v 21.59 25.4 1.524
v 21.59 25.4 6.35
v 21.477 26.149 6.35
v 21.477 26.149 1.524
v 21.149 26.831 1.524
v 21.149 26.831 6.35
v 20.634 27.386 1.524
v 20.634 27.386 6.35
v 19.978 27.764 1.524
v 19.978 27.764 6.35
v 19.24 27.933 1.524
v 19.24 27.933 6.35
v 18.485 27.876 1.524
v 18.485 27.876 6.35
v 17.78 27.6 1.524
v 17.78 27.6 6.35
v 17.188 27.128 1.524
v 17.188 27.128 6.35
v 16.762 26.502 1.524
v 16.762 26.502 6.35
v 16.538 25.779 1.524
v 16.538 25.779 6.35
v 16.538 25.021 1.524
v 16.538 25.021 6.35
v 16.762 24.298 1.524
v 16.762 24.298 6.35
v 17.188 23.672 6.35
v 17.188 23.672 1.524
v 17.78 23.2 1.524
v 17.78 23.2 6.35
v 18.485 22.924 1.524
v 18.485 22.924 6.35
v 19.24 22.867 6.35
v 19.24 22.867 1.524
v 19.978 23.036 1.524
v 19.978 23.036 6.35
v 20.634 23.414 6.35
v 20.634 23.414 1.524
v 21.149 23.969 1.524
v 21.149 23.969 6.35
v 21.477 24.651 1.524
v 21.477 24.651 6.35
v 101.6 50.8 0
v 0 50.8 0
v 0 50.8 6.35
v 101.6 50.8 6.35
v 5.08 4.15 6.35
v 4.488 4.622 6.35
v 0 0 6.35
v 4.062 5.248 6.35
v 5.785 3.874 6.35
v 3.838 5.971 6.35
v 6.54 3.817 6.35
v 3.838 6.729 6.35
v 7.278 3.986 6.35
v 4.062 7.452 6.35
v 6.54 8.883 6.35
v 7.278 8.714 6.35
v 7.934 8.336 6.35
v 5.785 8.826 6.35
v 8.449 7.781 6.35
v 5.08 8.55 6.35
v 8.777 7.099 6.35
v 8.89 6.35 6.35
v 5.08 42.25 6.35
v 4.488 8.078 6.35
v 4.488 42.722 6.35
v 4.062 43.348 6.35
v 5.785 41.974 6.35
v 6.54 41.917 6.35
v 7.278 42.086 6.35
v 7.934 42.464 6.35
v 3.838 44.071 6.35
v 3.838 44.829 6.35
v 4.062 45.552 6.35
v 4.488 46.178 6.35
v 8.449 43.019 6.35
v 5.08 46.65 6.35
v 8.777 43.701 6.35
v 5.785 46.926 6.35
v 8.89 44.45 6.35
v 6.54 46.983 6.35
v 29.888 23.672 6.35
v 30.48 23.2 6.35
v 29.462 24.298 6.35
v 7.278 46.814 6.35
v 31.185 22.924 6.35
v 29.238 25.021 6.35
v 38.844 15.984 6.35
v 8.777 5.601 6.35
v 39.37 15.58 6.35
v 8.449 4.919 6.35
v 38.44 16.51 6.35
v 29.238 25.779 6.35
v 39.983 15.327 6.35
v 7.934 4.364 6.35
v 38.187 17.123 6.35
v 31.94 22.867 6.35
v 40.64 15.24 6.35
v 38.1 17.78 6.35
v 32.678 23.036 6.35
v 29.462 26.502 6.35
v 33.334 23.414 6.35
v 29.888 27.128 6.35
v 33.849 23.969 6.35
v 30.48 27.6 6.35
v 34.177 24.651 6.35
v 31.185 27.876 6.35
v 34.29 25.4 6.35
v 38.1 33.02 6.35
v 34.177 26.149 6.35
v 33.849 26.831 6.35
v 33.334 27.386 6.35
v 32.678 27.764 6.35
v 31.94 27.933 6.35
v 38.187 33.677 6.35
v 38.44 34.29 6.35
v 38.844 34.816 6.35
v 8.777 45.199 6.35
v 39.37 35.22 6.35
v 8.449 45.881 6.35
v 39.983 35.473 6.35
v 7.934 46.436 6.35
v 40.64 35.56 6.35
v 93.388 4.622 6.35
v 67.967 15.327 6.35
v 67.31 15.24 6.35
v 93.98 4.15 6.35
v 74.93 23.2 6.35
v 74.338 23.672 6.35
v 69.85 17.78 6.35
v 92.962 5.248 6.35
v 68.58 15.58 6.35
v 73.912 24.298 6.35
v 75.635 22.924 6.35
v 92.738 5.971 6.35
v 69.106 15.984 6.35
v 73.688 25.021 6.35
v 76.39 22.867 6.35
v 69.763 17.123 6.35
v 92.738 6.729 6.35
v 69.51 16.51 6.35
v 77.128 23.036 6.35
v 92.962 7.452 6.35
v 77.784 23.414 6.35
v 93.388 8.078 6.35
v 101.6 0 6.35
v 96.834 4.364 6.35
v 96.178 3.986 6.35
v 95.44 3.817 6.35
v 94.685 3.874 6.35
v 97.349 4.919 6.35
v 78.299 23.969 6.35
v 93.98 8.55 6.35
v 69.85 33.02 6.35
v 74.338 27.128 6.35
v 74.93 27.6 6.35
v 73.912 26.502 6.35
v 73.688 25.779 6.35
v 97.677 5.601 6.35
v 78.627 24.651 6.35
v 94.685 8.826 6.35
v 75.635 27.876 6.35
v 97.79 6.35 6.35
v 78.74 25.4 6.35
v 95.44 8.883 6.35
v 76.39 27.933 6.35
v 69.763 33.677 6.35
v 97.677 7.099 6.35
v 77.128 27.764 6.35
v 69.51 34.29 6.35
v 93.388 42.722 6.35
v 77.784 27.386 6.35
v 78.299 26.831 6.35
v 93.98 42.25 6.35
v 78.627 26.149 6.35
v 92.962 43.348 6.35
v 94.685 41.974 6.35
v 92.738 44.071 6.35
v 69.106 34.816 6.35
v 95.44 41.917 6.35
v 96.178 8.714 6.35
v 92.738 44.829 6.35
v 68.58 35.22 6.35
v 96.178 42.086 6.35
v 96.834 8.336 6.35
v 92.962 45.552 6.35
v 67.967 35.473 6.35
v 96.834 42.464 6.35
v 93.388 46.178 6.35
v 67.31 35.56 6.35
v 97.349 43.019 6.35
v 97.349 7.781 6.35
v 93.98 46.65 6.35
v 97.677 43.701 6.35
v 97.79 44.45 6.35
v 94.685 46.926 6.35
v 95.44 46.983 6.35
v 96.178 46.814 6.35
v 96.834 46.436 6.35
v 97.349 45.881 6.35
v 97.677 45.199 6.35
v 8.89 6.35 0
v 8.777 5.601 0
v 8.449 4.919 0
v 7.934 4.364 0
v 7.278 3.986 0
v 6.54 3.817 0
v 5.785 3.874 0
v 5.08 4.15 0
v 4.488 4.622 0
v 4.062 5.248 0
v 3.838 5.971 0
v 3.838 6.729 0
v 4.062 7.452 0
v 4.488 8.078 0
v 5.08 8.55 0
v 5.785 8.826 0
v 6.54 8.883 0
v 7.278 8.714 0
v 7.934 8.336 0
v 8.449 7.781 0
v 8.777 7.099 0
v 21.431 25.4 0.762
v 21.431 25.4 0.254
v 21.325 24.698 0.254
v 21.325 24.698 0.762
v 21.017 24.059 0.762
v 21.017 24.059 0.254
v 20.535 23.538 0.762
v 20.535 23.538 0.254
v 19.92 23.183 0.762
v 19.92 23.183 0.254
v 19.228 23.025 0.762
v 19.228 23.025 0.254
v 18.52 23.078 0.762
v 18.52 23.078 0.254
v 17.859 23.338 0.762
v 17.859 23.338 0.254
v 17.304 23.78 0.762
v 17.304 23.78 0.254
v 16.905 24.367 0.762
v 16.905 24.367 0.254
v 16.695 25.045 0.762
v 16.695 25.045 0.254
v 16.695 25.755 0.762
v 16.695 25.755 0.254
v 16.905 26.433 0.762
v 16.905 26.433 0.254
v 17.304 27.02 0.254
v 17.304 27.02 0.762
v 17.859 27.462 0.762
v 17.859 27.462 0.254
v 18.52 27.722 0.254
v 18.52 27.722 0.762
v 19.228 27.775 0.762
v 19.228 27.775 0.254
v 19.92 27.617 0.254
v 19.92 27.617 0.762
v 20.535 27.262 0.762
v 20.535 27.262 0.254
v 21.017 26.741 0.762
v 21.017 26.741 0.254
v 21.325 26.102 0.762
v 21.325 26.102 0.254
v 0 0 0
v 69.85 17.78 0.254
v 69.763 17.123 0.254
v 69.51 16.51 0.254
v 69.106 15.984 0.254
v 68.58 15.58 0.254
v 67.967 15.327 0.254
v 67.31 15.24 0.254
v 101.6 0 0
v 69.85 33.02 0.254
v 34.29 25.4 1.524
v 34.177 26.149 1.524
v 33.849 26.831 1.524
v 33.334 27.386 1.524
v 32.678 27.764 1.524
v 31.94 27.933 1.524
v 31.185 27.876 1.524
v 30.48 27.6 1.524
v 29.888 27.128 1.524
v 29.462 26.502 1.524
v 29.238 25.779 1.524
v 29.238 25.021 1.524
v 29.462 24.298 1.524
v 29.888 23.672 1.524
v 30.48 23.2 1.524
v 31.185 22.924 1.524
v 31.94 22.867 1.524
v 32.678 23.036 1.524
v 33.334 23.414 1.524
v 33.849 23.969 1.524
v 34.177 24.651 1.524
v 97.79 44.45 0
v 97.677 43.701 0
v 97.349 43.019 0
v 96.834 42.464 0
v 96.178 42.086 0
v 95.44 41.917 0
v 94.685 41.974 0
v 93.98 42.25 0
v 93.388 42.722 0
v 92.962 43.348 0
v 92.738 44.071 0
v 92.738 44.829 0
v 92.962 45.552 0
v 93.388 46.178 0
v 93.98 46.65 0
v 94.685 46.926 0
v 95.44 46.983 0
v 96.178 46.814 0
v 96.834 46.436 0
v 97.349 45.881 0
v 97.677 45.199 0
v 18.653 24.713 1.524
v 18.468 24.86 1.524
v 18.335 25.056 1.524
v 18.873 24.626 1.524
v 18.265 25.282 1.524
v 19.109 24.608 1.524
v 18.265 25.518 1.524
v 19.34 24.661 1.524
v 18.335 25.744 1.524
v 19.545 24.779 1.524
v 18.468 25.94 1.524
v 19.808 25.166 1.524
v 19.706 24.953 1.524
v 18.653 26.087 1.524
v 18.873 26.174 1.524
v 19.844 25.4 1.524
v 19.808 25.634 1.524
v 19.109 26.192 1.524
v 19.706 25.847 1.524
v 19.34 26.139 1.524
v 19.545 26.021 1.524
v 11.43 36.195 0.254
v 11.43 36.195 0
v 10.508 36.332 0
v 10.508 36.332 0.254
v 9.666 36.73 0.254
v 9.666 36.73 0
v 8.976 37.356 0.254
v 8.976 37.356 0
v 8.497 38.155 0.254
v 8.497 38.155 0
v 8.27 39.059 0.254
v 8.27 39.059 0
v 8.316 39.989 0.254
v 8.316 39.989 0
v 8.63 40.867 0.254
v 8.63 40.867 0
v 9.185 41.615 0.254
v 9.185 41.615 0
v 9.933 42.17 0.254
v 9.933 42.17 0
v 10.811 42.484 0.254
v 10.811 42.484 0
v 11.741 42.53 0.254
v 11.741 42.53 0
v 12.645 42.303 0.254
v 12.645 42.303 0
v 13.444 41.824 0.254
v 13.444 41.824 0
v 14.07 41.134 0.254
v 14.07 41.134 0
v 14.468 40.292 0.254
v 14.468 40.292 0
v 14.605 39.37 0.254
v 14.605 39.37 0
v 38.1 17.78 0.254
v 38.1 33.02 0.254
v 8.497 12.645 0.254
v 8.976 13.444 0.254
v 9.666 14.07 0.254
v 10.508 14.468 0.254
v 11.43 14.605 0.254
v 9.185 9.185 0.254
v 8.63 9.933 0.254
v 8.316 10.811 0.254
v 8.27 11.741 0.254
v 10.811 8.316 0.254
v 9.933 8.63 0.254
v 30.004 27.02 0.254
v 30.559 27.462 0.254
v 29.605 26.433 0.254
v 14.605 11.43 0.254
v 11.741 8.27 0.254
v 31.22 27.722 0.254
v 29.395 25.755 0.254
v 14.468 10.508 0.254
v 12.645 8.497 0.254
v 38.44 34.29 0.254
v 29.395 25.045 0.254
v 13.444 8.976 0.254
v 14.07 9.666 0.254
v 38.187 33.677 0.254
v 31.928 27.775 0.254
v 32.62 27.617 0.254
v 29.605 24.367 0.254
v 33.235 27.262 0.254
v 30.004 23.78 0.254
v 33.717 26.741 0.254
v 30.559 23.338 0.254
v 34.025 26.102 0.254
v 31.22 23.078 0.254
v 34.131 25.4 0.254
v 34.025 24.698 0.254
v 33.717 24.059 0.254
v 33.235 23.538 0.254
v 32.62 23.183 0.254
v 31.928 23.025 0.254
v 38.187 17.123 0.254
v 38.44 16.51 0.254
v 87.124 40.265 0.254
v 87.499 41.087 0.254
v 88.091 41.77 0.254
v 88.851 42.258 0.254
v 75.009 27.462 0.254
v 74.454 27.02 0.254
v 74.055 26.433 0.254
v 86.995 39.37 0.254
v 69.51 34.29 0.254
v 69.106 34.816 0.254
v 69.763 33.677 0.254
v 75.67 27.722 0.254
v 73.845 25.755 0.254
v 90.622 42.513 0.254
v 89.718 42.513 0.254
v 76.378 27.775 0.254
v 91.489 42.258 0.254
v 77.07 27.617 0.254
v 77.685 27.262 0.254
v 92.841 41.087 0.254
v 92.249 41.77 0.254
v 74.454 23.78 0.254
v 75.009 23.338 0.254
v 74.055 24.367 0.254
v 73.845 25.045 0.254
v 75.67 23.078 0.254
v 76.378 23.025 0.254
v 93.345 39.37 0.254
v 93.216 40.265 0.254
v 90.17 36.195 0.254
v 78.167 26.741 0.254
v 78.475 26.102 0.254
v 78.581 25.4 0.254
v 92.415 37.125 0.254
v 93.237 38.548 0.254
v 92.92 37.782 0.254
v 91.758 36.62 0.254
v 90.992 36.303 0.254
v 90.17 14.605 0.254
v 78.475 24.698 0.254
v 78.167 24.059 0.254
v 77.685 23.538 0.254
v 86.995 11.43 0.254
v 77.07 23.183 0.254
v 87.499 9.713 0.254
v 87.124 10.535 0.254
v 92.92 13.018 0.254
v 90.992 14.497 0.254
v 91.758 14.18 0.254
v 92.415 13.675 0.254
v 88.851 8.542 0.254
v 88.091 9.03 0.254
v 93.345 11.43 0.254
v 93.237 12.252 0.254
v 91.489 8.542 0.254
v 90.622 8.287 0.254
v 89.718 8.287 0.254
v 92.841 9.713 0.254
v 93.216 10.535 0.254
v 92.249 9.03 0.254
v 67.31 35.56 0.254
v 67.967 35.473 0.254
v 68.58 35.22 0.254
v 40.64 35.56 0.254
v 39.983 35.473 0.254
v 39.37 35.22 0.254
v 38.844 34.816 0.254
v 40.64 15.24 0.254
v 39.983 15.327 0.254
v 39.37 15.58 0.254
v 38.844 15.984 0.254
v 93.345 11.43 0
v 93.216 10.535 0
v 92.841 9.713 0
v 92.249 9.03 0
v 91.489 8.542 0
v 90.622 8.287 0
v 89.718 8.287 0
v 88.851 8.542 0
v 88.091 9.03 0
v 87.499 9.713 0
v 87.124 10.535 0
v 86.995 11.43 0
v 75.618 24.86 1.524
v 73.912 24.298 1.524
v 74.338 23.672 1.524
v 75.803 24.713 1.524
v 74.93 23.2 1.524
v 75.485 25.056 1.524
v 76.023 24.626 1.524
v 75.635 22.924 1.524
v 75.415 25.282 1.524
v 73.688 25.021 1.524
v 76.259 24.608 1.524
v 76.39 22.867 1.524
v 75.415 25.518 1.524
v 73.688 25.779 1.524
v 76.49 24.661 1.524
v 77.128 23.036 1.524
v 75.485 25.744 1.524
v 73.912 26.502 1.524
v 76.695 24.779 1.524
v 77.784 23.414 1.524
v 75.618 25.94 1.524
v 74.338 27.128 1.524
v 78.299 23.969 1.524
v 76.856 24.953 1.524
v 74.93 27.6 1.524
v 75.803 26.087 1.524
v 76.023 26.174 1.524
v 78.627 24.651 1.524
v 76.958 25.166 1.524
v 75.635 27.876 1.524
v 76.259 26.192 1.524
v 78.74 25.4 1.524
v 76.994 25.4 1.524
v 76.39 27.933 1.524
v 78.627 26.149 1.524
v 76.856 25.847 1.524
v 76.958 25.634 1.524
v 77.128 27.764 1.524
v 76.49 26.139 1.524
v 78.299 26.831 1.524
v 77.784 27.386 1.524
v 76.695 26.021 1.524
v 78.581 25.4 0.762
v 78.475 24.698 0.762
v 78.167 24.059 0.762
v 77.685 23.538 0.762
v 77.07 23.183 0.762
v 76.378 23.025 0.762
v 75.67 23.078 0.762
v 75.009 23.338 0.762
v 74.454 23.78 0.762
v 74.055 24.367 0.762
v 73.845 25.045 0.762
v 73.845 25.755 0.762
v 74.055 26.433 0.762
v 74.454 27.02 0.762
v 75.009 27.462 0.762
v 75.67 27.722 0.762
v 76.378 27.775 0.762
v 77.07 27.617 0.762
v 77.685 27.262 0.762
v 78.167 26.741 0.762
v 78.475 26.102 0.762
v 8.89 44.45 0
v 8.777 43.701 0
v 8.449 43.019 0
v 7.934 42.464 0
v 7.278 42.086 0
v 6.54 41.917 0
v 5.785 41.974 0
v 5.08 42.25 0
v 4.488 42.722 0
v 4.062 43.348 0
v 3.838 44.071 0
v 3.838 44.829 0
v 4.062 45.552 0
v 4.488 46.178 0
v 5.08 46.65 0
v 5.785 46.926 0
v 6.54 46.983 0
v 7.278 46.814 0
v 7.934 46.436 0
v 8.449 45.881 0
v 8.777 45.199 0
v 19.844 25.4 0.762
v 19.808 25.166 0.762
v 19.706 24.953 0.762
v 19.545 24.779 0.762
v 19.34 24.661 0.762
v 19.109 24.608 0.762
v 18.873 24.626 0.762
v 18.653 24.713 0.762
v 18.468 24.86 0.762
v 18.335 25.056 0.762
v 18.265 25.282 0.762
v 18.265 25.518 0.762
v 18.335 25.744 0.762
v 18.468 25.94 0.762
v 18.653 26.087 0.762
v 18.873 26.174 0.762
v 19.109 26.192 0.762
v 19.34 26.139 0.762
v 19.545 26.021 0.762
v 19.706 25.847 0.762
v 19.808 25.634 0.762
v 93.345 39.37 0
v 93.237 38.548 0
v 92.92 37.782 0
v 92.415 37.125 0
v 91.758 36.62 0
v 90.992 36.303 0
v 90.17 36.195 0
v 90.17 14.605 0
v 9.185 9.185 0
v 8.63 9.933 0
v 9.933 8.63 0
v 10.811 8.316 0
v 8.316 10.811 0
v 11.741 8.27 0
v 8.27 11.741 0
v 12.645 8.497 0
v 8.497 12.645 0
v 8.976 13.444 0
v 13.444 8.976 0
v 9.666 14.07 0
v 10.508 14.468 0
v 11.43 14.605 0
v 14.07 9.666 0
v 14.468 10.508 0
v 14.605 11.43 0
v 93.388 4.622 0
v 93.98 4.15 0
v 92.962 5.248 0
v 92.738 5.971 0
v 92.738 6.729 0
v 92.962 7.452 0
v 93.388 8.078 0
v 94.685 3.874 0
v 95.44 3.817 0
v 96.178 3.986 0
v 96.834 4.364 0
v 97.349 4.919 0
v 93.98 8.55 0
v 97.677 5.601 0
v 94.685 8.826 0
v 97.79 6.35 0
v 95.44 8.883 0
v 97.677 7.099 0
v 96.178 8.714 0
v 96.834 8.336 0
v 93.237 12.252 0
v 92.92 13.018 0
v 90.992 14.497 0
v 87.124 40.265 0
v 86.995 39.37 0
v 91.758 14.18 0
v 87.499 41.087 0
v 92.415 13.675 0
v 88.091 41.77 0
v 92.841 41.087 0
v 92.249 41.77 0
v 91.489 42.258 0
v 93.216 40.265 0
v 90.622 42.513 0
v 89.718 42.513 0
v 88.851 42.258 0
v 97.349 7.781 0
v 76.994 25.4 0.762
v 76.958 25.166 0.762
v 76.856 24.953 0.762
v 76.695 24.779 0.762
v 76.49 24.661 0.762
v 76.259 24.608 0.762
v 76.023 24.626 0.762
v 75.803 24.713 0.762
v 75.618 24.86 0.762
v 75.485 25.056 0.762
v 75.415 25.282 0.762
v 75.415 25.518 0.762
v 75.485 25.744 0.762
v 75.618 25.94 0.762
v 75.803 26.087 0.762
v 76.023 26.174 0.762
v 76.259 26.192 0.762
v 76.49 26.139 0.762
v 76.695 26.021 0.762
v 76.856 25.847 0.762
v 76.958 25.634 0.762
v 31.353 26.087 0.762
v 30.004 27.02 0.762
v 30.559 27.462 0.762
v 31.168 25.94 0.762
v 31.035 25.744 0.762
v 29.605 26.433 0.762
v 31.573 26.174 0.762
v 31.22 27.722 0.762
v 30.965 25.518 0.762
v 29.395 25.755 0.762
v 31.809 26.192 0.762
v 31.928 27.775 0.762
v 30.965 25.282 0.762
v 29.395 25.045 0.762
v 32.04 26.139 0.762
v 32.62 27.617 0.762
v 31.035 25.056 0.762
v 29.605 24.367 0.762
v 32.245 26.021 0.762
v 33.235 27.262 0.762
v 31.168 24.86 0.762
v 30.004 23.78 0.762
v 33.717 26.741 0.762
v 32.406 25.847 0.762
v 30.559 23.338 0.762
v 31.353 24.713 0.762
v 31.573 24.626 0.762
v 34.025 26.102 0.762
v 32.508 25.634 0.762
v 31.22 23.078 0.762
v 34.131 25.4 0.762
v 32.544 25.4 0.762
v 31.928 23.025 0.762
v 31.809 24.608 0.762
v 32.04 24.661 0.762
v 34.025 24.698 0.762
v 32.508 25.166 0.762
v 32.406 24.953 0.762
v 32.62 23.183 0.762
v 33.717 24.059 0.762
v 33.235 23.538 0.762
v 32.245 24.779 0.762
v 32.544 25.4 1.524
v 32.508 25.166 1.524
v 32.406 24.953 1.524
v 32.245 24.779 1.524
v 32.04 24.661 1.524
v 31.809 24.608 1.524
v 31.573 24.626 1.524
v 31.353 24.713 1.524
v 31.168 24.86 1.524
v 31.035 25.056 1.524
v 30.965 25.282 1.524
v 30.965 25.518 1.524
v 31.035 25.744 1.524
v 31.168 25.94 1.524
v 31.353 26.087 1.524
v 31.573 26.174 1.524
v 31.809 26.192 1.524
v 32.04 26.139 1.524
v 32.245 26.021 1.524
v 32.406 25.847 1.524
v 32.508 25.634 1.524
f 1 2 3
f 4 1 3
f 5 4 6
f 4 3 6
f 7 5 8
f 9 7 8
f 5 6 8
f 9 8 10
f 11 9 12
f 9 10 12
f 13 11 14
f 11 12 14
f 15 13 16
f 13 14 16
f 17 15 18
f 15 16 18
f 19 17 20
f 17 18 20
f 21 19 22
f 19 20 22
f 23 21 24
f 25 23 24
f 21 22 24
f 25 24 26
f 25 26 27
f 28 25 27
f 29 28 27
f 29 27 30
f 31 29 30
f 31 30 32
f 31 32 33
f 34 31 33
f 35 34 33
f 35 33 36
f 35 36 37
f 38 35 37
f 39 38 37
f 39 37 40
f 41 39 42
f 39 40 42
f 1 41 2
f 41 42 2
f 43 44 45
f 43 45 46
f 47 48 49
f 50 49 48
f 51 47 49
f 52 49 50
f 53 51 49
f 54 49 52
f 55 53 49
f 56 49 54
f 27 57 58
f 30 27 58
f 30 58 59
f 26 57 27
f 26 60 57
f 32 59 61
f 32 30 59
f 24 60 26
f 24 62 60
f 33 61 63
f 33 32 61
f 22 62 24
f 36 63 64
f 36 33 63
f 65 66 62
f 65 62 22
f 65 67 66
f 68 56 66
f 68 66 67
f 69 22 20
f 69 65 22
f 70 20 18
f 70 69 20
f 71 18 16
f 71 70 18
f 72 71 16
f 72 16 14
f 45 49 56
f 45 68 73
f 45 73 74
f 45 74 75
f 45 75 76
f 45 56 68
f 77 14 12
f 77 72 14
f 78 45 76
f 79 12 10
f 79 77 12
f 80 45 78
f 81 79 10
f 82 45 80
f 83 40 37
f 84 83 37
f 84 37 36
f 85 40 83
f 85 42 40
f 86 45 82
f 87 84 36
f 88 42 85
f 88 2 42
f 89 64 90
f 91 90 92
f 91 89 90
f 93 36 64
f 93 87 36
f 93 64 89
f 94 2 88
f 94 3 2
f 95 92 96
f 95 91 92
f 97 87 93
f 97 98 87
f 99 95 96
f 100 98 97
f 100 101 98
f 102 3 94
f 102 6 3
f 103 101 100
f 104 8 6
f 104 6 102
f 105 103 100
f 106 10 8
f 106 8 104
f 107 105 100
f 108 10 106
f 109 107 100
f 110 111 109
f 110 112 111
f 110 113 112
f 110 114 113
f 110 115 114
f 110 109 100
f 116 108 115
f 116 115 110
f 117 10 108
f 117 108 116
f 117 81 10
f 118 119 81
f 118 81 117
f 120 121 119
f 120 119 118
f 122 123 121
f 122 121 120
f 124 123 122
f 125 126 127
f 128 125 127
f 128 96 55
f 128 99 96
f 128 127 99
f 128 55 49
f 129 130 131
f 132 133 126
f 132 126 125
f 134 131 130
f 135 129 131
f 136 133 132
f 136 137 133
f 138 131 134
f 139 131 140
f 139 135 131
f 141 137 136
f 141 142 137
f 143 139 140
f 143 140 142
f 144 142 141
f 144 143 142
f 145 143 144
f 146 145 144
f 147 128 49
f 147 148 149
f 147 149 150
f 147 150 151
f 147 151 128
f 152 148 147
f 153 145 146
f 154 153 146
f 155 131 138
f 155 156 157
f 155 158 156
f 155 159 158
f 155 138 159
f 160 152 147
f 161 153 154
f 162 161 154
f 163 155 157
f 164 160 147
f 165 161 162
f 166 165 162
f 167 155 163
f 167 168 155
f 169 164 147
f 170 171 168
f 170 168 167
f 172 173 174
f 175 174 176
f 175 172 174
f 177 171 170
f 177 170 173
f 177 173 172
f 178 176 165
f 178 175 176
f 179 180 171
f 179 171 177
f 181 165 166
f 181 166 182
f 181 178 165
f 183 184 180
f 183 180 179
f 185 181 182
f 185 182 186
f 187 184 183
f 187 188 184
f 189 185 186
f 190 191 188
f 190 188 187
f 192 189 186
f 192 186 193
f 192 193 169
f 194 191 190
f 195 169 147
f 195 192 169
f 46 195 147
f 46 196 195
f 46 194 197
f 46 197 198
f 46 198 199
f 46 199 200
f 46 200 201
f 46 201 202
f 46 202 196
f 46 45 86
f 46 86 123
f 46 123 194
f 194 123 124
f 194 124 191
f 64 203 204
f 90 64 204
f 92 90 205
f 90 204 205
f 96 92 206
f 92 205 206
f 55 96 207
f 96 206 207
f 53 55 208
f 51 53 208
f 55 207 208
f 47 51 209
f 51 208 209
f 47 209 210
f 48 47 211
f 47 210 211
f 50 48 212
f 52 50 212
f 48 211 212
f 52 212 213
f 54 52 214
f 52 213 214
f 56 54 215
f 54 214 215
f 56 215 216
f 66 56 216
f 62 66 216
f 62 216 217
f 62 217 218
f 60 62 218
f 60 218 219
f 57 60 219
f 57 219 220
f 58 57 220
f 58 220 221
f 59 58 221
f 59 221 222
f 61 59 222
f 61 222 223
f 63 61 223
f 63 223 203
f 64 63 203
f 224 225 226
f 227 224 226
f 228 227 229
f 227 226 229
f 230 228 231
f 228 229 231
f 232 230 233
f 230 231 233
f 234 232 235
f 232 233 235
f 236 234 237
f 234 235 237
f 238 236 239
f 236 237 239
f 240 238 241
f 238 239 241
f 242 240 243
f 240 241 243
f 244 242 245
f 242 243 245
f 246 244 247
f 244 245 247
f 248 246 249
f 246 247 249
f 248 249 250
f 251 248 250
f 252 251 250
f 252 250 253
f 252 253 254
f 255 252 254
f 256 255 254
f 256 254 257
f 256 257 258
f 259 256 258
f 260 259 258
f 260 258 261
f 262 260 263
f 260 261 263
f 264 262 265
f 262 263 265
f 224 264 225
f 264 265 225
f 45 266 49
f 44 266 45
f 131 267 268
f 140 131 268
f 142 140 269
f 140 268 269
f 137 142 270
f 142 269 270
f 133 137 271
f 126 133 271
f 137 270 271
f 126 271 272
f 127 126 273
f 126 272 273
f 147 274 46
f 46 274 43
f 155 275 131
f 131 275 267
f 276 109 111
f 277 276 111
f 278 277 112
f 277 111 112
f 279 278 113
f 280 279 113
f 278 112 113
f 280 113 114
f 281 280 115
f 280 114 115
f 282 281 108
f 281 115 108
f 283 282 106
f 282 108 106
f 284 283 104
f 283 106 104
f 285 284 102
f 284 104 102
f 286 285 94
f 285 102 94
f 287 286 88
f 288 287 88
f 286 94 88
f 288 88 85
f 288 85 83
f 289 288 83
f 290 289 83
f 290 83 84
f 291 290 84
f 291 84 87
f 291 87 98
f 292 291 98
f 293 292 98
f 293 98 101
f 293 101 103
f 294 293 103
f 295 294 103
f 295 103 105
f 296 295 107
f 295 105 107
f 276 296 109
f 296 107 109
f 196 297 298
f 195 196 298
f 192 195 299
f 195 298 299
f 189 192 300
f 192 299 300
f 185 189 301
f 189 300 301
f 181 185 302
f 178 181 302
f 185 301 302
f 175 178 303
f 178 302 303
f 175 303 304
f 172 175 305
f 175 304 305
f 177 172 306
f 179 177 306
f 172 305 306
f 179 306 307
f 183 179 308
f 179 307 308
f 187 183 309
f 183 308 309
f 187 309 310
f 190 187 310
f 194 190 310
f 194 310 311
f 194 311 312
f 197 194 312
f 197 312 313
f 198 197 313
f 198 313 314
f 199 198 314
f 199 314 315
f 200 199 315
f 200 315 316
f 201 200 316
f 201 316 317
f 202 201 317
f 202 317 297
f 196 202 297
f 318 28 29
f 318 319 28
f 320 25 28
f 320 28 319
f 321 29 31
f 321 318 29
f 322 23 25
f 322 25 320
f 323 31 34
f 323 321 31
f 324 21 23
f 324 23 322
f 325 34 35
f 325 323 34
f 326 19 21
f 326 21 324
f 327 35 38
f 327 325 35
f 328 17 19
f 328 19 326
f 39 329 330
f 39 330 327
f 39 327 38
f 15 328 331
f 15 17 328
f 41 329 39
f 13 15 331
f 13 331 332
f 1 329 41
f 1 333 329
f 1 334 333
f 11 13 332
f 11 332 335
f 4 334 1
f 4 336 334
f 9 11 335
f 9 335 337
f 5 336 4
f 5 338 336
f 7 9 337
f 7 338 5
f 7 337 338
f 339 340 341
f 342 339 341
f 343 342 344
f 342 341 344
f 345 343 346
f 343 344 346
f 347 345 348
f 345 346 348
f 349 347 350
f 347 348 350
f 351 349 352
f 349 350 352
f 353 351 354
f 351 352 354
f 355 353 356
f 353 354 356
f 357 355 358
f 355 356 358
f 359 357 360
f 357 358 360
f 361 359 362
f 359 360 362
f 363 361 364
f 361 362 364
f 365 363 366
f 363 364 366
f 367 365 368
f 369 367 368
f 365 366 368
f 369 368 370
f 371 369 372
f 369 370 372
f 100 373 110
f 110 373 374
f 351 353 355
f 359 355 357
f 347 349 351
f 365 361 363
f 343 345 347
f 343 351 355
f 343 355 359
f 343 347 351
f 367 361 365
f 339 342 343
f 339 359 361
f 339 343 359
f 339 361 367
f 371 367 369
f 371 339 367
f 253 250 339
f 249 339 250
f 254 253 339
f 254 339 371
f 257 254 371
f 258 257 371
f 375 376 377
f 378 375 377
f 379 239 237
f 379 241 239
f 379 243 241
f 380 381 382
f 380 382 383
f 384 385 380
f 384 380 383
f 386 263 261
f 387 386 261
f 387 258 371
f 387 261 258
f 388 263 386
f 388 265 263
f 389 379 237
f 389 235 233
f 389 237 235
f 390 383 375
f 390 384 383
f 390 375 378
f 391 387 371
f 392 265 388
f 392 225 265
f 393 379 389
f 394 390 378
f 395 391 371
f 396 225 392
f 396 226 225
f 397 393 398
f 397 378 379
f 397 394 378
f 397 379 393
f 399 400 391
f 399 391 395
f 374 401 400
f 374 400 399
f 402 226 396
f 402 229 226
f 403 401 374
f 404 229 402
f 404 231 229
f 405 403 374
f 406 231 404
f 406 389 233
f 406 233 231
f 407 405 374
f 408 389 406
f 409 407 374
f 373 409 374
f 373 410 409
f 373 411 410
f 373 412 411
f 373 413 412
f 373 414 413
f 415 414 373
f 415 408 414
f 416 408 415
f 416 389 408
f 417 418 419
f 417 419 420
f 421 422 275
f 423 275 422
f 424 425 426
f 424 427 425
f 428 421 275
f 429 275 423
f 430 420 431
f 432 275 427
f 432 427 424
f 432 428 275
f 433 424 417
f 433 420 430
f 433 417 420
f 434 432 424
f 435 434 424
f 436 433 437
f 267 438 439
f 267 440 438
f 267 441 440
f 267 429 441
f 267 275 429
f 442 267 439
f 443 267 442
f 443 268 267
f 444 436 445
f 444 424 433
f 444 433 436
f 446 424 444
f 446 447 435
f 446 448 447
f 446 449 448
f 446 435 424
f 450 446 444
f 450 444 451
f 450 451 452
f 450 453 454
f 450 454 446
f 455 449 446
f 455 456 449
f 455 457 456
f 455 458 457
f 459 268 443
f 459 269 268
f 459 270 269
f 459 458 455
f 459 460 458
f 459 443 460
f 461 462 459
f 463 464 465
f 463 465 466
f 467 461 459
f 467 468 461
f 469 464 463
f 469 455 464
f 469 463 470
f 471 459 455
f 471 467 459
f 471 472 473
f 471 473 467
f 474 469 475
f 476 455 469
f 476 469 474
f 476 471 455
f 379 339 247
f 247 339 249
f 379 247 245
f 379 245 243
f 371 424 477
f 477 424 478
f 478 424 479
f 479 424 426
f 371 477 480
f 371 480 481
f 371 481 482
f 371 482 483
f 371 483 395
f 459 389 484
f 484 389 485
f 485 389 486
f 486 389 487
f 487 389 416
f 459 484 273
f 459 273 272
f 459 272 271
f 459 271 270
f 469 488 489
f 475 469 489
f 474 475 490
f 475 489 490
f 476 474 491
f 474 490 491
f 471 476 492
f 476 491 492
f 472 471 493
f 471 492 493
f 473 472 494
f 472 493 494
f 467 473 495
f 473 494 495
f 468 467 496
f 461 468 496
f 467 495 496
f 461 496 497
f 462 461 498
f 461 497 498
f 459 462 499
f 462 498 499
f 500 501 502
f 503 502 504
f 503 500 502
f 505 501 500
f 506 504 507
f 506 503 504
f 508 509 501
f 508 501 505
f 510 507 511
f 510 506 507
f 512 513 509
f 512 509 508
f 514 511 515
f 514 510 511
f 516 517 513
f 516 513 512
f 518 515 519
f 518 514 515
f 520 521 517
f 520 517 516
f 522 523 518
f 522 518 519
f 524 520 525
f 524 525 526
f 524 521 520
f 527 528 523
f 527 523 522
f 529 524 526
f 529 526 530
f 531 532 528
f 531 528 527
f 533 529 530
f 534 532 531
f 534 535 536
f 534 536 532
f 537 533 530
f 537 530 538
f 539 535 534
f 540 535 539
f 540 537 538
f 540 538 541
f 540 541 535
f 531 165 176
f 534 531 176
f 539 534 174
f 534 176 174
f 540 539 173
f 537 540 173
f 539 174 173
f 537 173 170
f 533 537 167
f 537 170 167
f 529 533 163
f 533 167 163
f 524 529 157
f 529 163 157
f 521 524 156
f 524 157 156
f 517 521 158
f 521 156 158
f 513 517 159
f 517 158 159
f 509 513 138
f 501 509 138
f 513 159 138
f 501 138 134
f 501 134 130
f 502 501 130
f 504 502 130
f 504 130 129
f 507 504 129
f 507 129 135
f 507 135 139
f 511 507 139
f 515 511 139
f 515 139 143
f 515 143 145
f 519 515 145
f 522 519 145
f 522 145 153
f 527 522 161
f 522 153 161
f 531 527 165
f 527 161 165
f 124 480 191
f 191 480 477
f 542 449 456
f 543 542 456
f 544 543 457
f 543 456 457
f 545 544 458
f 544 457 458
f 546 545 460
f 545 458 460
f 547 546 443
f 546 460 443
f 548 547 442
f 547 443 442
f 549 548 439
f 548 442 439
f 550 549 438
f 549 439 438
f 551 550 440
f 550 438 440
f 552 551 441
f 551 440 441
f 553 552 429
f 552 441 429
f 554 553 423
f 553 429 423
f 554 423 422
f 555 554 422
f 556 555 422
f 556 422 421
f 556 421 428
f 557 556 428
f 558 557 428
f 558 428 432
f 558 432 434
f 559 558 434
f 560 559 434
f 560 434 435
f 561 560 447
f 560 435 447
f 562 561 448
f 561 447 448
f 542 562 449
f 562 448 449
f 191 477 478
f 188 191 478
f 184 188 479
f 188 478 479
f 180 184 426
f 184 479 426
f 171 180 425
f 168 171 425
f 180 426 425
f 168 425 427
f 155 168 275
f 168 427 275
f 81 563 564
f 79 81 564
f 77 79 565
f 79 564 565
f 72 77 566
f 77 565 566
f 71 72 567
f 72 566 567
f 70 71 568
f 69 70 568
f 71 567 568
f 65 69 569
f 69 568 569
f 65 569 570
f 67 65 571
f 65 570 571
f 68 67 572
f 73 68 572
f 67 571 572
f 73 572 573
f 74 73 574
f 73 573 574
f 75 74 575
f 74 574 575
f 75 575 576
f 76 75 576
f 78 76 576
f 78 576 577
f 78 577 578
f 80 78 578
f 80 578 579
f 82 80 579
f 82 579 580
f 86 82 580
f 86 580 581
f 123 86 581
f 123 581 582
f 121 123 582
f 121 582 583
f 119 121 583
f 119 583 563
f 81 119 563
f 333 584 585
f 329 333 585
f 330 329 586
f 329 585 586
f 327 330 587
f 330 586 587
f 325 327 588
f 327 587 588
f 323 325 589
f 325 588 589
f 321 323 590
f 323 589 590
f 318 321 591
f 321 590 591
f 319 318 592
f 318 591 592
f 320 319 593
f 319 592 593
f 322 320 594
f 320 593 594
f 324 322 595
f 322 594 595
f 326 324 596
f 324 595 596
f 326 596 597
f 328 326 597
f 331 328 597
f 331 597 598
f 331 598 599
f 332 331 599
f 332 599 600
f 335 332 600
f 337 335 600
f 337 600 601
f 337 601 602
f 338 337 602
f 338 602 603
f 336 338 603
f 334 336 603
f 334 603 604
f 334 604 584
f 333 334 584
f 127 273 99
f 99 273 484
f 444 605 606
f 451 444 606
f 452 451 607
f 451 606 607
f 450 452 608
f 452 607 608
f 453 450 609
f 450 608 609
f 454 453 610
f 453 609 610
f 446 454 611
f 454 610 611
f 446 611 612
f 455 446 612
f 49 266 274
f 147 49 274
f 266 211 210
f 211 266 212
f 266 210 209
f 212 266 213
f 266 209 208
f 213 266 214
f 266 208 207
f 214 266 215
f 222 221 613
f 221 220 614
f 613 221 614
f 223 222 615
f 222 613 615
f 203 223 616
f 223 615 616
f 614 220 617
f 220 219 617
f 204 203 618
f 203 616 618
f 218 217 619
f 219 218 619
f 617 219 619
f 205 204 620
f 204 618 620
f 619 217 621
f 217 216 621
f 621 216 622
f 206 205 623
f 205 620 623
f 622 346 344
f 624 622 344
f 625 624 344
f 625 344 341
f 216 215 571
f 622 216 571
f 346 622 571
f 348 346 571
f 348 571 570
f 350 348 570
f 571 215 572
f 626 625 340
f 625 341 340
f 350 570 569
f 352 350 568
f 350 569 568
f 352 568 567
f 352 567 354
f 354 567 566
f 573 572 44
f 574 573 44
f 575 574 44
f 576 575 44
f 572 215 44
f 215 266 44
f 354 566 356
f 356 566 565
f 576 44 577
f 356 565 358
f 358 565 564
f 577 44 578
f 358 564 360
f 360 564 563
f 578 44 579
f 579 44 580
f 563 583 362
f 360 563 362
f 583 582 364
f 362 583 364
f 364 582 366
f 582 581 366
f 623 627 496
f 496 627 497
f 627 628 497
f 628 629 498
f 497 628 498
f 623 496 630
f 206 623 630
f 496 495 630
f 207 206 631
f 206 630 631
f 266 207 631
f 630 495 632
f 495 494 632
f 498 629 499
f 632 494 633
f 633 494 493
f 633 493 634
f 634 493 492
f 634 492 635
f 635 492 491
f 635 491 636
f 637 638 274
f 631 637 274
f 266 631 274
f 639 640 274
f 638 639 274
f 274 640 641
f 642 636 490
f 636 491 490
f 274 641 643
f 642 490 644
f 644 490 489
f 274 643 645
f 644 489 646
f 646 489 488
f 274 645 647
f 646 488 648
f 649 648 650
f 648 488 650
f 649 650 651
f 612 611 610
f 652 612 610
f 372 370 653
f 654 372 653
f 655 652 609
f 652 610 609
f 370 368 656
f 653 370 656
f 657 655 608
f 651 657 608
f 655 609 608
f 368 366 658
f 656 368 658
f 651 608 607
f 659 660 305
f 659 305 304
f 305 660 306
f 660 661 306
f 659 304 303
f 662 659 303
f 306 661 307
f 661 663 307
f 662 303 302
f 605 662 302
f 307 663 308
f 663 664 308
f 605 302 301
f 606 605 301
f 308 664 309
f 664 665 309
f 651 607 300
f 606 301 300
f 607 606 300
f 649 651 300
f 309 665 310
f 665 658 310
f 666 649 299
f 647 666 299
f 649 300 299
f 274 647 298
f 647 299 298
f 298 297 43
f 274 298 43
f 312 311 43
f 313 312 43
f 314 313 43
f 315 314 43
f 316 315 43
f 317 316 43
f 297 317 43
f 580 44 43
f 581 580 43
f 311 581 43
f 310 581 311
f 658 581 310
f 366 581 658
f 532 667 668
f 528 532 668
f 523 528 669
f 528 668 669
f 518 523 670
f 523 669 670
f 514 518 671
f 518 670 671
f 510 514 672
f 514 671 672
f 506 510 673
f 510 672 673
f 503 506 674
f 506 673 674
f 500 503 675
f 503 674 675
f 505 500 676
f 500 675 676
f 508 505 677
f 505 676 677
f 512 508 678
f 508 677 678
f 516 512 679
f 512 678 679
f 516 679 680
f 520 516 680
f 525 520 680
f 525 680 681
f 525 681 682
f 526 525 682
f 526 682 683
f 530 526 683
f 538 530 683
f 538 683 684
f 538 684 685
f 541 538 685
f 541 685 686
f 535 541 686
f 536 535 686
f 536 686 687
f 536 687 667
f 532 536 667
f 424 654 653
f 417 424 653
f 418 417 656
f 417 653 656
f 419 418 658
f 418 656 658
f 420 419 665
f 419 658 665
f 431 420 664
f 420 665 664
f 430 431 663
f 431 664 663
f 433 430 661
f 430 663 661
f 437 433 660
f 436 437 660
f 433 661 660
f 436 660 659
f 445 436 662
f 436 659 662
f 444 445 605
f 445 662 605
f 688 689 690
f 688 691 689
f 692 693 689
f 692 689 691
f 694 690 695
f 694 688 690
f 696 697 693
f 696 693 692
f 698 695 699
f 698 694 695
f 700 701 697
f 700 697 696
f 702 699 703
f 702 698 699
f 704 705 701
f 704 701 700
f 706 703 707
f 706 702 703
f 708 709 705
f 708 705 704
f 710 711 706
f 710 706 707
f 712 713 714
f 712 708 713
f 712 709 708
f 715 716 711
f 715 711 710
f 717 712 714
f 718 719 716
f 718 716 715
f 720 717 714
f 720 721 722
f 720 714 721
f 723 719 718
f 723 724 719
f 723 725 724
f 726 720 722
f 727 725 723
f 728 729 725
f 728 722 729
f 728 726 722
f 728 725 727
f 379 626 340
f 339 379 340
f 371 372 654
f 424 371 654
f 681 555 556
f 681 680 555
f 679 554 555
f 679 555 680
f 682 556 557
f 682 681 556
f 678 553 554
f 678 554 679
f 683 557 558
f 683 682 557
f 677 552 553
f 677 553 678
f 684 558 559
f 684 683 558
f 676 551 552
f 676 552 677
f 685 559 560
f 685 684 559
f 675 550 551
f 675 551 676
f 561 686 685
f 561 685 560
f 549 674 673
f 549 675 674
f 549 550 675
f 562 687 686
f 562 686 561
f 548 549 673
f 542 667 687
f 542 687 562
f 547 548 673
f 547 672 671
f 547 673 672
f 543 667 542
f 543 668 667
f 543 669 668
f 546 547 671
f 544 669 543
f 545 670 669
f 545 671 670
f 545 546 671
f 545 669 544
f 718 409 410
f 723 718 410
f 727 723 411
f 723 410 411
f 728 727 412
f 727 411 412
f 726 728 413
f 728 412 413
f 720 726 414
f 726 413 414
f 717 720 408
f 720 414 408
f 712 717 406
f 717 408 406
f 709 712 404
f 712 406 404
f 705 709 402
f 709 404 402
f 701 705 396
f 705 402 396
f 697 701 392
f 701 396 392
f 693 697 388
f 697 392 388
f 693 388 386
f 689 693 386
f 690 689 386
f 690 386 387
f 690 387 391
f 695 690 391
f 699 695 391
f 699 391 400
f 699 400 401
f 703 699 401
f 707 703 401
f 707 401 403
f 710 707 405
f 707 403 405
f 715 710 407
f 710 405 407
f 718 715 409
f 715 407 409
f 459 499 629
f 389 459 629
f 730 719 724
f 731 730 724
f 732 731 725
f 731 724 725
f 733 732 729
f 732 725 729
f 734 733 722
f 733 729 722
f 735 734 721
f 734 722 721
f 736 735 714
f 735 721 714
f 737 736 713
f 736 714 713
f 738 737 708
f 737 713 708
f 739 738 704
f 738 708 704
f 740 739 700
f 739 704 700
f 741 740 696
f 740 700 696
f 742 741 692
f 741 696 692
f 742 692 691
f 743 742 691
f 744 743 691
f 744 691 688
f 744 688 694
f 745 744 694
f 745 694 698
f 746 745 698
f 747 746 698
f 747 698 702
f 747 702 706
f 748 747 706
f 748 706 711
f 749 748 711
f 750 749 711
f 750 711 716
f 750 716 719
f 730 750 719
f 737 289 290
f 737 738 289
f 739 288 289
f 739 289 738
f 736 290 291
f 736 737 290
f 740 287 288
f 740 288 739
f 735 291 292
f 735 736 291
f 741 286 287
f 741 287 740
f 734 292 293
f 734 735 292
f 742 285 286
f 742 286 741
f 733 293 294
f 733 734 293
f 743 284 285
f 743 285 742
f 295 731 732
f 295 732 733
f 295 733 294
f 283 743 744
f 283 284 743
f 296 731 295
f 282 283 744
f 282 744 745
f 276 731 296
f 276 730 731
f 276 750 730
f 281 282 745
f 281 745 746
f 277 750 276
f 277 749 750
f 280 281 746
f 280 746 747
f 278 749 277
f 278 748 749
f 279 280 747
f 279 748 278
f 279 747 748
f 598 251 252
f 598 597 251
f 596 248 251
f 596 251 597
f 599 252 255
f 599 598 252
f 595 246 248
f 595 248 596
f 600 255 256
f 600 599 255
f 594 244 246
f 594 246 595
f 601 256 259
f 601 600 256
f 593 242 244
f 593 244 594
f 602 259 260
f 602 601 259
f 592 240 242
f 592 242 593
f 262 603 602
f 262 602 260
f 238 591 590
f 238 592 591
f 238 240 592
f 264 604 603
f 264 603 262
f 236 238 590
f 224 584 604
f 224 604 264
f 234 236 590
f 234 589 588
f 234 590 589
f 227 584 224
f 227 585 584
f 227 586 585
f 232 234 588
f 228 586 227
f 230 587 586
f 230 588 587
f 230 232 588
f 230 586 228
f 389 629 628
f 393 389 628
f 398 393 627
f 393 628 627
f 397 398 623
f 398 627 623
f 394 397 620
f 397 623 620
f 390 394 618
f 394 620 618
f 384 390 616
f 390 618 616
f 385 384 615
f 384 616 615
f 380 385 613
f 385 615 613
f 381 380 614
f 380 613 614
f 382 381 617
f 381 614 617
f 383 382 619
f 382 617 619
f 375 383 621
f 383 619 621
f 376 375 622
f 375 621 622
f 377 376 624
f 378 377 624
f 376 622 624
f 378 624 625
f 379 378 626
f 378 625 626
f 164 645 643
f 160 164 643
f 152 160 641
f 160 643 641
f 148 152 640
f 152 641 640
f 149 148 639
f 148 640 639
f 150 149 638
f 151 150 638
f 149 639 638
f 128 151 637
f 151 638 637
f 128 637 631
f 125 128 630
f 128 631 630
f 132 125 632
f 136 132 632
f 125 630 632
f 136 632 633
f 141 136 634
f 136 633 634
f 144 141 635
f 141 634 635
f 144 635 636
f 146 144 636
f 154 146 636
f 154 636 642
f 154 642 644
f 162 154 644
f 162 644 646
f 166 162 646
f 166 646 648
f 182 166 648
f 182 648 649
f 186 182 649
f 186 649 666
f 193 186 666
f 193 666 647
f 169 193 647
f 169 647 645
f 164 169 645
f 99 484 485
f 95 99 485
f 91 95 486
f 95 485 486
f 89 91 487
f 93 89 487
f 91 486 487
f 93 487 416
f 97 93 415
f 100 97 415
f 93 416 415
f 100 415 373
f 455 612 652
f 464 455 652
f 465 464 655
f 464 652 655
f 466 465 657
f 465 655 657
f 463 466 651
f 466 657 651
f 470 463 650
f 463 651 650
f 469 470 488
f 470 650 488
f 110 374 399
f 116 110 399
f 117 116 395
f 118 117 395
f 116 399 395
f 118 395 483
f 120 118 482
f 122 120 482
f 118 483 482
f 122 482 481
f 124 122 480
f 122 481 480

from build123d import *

# Parameters (mm, degrees)
F0_W      = 101.6
F0_H      = 50.8
F1_DEPTH  = 6.35
F3_DEPTH  = 0.254
F4_R      = 2.54
F5_DEPTH  = 6.351
F6_R      = 2.38125
F7_DEPTH  = 0.508
F8_R      = 0.79375
F9_DEPTH  = 1.27
F10_R     = 2.54
F11_DEPTH = 4.826
F13_DEPTH = 6.096


# Not quite as in the source:
# - a feature names something its author has since deleted; it is built from what else it names


with BuildPart() as f1:
    # F0 (on Top) → F1 (new body)
    with BuildSketch(Plane.XY):
        with Locations((50.8, 25.4)):
            Rectangle(F0_W, F0_H)
    extrude(amount=F1_DEPTH)

    # F2 (on face) → F3 (cut)
    with BuildSketch(Plane(origin=(0, 0, 0), x_dir=(1, 0, 0), z_dir=(0, 0, -1))):
        with BuildLine():
            Line((11.43, -14.605), (11.43, -11.43))
            Line((11.43, -11.43), (14.605, -11.43))
            ThreePointArc((14.605, -11.43), (9.1849359697, -9.1849359697), (11.43, -14.605))
        make_face()
        with BuildLine():
            Line((14.605, -11.43), (11.43, -11.43))
            Line((11.43, -11.43), (11.43, -14.605))
            ThreePointArc((11.43, -14.605), (13.6750640303, -13.6750640303), (14.605, -11.43))
        make_face()
        with BuildLine():
            Line((86.995, -11.43), (14.605, -11.43))
            ThreePointArc((14.605, -11.43), (13.6750640303, -13.6750640303), (11.43, -14.605))
            Line((11.43, -14.605), (11.43, -36.195))
            ThreePointArc((11.43, -36.195), (13.6750640303, -37.1249359697), (14.605, -39.37))
            Line((14.605, -39.37), (86.995, -39.37))
            ThreePointArc((86.995, -39.37), (87.9249359697, -37.1249359697), (90.17, -36.195))
            Line((90.17, -36.195), (90.17, -14.605))
            ThreePointArc((90.17, -14.605), (87.9249359697, -13.6750640303), (86.995, -11.43))
        make_face()
        with BuildLine():
            ThreePointArc((93.345, -11.43), (90.17, -8.255), (86.995, -11.43))
            Line((86.995, -11.43), (90.17, -11.43))
            Line((90.17, -11.43), (90.17, -14.605))
            ThreePointArc((90.17, -14.605), (92.4150640303, -13.6750640303), (93.345, -11.43))
        make_face()
        with BuildLine():
            Line((90.17, -11.43), (86.995, -11.43))
            ThreePointArc((86.995, -11.43), (87.9249359697, -13.6750640303), (90.17, -14.605))
            Line((90.17, -14.605), (90.17, -11.43))
        make_face()
        with BuildLine():
            ThreePointArc((14.605, -39.37), (13.6750640303, -37.1249359697), (11.43, -36.195))
            Line((11.43, -36.195), (11.43, -39.37))
            Line((11.43, -39.37), (14.605, -39.37))
        make_face()
        with BuildLine():
            Line((11.43, -39.37), (11.43, -36.195))
            ThreePointArc((11.43, -36.195), (9.1849359697, -41.6150640303), (14.605, -39.37))
            Line((14.605, -39.37), (11.43, -39.37))
        make_face()
        with BuildLine():
            ThreePointArc((93.345, -39.37), (92.4150640303, -37.1249359697), (90.17, -36.195))
            Line((90.17, -36.195), (90.17, -39.37))
            Line((90.17, -39.37), (86.995, -39.37))
            ThreePointArc((86.995, -39.37), (90.17, -42.545), (93.345, -39.37))
        make_face()
        with BuildLine():
            Line((90.17, -39.37), (90.17, -36.195))
            ThreePointArc((90.17, -36.195), (87.9249359697, -37.1249359697), (86.995, -39.37))
            Line((86.995, -39.37), (90.17, -39.37))
        make_face()
    extrude(amount=-F3_DEPTH, mode=Mode.SUBTRACT)

    # F4 (on face) → F5 (cut, through all)
    with BuildSketch(Plane(origin=(0, 0, 0), x_dir=(1, 0, 0), z_dir=(0, 0, -1))):
        with Locations((95.25, -6.35)):
            Circle(F4_R)
        with Locations((6.35, -6.35)):
            Circle(F4_R)
        with Locations((6.35, -44.45)):
            Circle(F4_R)
        with Locations((95.25, -44.45)):
            Circle(F4_R)
    extrude(amount=-F5_DEPTH, mode=Mode.SUBTRACT)

    # F6 (on face) → F7 (cut)
    with BuildSketch(Plane(origin=(0, 0, 0.254), x_dir=(1, 0, 0), z_dir=(0, 0, -1))):
        with Locations((31.75, -25.4)):
            Circle(F6_R)
        with Locations((19.05, -25.4)):
            Circle(F6_R)
        with Locations((76.2, -25.4)):
            Circle(F6_R)
    extrude(amount=-F7_DEPTH, mode=Mode.SUBTRACT)

    # F8 (on face) → F9 (cut)
    with BuildSketch(Plane(origin=(0, 0, 0.762), x_dir=(1, 0, 0), z_dir=(0, 0, -1))):
        with Locations((19.05, -25.4)):
            Circle(F8_R)
        with Locations((31.75, -25.4)):
            Circle(F8_R)
        with Locations((76.2, -25.4)):
            Circle(F8_R)
    extrude(amount=-F9_DEPTH, mode=Mode.SUBTRACT)

    # F10 (on face) → F11 (cut)
    with BuildSketch(Plane.XY.offset(6.35)):
        with Locations((19.05, 25.4)):
            Circle(F10_R)
        with Locations((31.75, 25.4)):
            Circle(F10_R)
        with Locations((76.2, 25.4)):
            Circle(F10_R)
    extrude(amount=-F11_DEPTH, mode=Mode.SUBTRACT)

    # F12 (on face) → F13 (cut, through all)
    with BuildSketch(Plane(origin=(0, 0, 0.254), x_dir=(1, 0, 0), z_dir=(0, 0, -1))):
        with BuildLine():
            Line((67.31, -15.24), (40.64, -15.24))
            ThreePointArc((40.64, -15.24), (38.8439487758, -15.9839487758), (38.1, -17.78))
            Line((38.1, -17.78), (38.1, -33.02))
            ThreePointArc((38.1, -33.02), (38.8439487758, -34.8160512242), (40.64, -35.56))
            Line((40.64, -35.56), (67.31, -35.56))
            ThreePointArc((67.31, -35.56), (69.1060512242, -34.8160512242), (69.85, -33.02))
            Line((69.85, -33.02), (69.85, -17.78))
            ThreePointArc((69.85, -17.78), (69.1060512242, -15.9839487758), (67.31, -15.24))
        make_face()
    extrude(amount=-F13_DEPTH, mode=Mode.SUBTRACT)


solid = f1.part
